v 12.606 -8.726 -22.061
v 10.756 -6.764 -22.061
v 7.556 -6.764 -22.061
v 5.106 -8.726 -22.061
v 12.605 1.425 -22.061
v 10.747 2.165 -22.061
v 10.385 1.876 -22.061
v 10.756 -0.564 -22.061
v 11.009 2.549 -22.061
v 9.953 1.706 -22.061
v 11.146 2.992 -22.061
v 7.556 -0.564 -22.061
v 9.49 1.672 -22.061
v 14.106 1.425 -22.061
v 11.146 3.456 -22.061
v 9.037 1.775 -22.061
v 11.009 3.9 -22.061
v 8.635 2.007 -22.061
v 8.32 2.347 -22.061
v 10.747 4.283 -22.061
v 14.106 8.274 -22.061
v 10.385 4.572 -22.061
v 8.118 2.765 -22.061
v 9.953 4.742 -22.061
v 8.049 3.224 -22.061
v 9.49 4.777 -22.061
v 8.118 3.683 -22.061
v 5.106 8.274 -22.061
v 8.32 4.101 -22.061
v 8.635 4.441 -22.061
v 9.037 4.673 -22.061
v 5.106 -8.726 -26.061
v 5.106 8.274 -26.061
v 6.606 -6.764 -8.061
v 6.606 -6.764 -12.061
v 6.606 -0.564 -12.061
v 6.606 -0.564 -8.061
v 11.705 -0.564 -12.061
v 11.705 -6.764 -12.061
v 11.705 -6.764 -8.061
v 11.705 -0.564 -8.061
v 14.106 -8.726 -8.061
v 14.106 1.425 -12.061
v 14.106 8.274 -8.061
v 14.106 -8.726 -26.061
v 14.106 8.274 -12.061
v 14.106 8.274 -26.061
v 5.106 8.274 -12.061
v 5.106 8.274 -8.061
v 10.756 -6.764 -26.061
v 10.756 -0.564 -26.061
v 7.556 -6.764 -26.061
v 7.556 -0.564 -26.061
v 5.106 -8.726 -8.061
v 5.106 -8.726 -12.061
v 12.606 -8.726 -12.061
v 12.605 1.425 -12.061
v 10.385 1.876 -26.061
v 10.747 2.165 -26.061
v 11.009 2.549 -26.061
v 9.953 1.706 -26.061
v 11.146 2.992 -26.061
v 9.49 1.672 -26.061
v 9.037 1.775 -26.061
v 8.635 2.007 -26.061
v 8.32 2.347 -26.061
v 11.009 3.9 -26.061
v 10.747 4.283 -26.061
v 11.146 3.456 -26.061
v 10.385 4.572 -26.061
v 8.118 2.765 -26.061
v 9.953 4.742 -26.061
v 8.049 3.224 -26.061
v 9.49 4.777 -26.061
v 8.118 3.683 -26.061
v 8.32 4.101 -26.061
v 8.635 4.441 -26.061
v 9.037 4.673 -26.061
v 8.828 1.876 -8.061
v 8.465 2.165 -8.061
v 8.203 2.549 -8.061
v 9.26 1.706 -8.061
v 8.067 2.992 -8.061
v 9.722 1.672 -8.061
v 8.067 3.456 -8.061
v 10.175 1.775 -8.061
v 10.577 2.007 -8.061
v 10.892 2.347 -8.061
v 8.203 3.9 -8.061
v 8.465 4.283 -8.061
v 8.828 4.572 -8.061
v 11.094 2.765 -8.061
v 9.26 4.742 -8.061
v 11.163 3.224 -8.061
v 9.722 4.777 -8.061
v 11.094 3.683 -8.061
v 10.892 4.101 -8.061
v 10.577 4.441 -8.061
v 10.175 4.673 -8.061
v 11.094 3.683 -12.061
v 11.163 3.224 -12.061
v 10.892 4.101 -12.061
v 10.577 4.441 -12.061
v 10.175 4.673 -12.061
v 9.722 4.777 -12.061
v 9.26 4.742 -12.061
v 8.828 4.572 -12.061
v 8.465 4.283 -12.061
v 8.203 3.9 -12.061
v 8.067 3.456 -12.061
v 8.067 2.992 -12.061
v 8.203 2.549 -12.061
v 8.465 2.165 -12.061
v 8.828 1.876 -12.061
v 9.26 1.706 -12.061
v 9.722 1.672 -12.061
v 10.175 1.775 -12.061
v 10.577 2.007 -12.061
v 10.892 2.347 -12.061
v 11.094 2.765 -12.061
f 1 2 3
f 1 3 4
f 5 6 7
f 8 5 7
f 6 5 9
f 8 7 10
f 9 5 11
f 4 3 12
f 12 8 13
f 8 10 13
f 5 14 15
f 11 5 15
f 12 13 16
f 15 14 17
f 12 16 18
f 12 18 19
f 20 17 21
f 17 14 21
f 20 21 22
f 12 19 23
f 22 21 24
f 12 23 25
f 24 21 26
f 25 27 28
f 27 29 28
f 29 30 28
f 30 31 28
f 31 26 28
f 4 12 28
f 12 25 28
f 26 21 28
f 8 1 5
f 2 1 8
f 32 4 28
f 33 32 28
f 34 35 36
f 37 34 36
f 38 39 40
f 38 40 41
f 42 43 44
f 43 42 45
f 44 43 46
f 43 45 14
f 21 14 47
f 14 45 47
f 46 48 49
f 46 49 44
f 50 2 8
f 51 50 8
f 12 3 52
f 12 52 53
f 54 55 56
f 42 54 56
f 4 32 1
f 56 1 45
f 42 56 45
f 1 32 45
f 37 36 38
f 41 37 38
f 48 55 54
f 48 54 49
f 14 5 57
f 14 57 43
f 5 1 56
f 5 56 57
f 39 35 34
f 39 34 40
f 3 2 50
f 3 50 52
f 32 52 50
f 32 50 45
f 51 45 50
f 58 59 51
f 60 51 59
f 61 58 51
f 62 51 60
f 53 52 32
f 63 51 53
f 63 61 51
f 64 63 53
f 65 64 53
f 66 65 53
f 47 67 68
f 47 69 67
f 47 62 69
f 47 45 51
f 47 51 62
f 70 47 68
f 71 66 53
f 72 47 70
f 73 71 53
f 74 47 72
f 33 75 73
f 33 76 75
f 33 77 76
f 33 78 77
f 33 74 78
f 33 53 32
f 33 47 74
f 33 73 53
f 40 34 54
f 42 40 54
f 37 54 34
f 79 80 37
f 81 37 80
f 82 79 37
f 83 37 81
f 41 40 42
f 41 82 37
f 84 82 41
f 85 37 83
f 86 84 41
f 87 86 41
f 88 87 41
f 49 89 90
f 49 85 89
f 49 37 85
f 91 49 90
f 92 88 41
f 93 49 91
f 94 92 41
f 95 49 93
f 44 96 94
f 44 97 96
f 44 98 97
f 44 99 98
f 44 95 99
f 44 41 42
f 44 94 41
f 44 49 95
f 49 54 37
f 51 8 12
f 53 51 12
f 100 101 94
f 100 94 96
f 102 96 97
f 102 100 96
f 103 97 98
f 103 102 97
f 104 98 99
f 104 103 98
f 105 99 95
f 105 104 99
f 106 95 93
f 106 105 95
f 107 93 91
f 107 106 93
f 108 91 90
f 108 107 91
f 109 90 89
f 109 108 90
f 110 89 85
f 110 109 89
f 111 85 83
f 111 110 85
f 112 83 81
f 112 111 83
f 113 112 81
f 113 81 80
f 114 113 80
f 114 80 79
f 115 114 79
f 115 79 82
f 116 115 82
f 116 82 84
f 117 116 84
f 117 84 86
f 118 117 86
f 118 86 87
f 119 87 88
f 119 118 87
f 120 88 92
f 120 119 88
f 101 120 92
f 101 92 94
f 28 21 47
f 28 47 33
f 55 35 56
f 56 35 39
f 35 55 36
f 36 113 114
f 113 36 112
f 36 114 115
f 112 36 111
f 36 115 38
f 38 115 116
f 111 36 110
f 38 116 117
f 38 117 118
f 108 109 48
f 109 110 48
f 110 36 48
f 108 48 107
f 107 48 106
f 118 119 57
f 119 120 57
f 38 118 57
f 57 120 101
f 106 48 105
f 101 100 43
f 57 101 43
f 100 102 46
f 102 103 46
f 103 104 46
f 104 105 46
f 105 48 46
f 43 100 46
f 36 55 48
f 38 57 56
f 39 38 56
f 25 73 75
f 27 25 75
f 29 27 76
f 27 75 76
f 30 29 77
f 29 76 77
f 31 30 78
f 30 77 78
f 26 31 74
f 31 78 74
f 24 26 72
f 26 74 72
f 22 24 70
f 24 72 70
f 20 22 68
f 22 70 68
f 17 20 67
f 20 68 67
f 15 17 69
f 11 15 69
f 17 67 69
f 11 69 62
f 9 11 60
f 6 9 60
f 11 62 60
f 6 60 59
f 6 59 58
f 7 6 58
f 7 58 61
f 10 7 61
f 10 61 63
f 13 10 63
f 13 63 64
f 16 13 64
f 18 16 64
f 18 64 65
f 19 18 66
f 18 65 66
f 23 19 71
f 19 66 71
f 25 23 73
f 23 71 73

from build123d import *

# Parameters (mm, degrees)
SKIZZE3_W                       = 9
SKIZZE3_H                       = 10.1502367
SKIZZE3_W_2                     = 3.2
SKIZZE3_H_2                     = 6.2
AUFSATZ_LINEAR_AUSTRAGEN2_DEPTH = 4
AUFSATZ_LINEAR_AUSTRAGEN3_DEPTH = 10
SKIZZE6_W                       = 9
SKIZZE6_H                       = 6.8497633
AUFSATZ_LINEAR_AUSTRAGEN5_DEPTH = 4
SKIZZE7_R                       = 1.55688018
SCHNITT_LINEAR_AUSTRAGEN1_DEPTH = 4
SKIZZE8_W                       = 9
SKIZZE8_H                       = 17
SKIZZE8_R                       = 1.55688018
SKIZZE8_W_2                     = 5.098922271
SKIZZE8_H_2                     = 6.2
AUFSATZ_LINEAR_AUSTRAGEN6_DEPTH = 4


with BuildPart() as part:
    # Skizze3 → Aufsatz-Linear austragen2 (new body)
    with BuildSketch(Plane(origin=(0, 0, -22.061362238), x_dir=(-1, 0, 0), z_dir=(0, 0, -1))):
        with Locations((-9.606096766, -3.650507166)):
            Rectangle(SKIZZE3_W, SKIZZE3_H)
        with Locations((-9.155557902, -3.664383383)):
            Rectangle(SKIZZE3_W_2, SKIZZE3_H_2, mode=Mode.SUBTRACT)
    extrude(amount=AUFSATZ_LINEAR_AUSTRAGEN2_DEPTH)

    # Skizze4 → Aufsatz-Linear austragen3 (add)
    with BuildSketch(Plane.XY.offset(-22.061362238)):
        Polygon((12.605305007, 1.424611184), (14.106096766, 1.424611184), (14.106096766, -8.725625516), (12.606096766, -8.725625516), align=None)
    extrude(amount=AUFSATZ_LINEAR_AUSTRAGEN3_DEPTH)

    # Skizze6 → Aufsatz-Linear austragen5 (add)
    with BuildSketch(Plane(origin=(0, 0, -22.061362238), x_dir=(-1, 0, 0), z_dir=(0, 0, -1))):
        with Locations((-9.606096766, 4.849492834)):
            Rectangle(SKIZZE6_W, SKIZZE6_H)
    extrude(amount=AUFSATZ_LINEAR_AUSTRAGEN5_DEPTH)

    # Skizze7 → Schnitt-Linear austragen1 (cut)
    with BuildSketch(Plane(origin=(0, 0, -26.061362238), x_dir=(-1, 0, 0), z_dir=(0, 0, -1))):
        with Locations((-9.606096766, 3.224137783)):
            Circle(SKIZZE7_R)
    extrude(amount=-SCHNITT_LINEAR_AUSTRAGEN1_DEPTH, mode=Mode.SUBTRACT)

    # Skizze8 → Aufsatz-Linear austragen6 (add)
    with BuildSketch(Plane.XY.offset(-12.061362238)):
        with Locations((9.606096766, -0.225625516)):
            Rectangle(SKIZZE8_W, SKIZZE8_H)
        with Locations((9.606096766, 3.224137783)):
            Circle(SKIZZE8_R, mode=Mode.SUBTRACT)
        with Locations((9.155557901, -3.664383383)):
            Rectangle(SKIZZE8_W_2, SKIZZE8_H_2, mode=Mode.SUBTRACT)
    extrude(amount=AUFSATZ_LINEAR_AUSTRAGEN6_DEPTH)


solid = part.part
